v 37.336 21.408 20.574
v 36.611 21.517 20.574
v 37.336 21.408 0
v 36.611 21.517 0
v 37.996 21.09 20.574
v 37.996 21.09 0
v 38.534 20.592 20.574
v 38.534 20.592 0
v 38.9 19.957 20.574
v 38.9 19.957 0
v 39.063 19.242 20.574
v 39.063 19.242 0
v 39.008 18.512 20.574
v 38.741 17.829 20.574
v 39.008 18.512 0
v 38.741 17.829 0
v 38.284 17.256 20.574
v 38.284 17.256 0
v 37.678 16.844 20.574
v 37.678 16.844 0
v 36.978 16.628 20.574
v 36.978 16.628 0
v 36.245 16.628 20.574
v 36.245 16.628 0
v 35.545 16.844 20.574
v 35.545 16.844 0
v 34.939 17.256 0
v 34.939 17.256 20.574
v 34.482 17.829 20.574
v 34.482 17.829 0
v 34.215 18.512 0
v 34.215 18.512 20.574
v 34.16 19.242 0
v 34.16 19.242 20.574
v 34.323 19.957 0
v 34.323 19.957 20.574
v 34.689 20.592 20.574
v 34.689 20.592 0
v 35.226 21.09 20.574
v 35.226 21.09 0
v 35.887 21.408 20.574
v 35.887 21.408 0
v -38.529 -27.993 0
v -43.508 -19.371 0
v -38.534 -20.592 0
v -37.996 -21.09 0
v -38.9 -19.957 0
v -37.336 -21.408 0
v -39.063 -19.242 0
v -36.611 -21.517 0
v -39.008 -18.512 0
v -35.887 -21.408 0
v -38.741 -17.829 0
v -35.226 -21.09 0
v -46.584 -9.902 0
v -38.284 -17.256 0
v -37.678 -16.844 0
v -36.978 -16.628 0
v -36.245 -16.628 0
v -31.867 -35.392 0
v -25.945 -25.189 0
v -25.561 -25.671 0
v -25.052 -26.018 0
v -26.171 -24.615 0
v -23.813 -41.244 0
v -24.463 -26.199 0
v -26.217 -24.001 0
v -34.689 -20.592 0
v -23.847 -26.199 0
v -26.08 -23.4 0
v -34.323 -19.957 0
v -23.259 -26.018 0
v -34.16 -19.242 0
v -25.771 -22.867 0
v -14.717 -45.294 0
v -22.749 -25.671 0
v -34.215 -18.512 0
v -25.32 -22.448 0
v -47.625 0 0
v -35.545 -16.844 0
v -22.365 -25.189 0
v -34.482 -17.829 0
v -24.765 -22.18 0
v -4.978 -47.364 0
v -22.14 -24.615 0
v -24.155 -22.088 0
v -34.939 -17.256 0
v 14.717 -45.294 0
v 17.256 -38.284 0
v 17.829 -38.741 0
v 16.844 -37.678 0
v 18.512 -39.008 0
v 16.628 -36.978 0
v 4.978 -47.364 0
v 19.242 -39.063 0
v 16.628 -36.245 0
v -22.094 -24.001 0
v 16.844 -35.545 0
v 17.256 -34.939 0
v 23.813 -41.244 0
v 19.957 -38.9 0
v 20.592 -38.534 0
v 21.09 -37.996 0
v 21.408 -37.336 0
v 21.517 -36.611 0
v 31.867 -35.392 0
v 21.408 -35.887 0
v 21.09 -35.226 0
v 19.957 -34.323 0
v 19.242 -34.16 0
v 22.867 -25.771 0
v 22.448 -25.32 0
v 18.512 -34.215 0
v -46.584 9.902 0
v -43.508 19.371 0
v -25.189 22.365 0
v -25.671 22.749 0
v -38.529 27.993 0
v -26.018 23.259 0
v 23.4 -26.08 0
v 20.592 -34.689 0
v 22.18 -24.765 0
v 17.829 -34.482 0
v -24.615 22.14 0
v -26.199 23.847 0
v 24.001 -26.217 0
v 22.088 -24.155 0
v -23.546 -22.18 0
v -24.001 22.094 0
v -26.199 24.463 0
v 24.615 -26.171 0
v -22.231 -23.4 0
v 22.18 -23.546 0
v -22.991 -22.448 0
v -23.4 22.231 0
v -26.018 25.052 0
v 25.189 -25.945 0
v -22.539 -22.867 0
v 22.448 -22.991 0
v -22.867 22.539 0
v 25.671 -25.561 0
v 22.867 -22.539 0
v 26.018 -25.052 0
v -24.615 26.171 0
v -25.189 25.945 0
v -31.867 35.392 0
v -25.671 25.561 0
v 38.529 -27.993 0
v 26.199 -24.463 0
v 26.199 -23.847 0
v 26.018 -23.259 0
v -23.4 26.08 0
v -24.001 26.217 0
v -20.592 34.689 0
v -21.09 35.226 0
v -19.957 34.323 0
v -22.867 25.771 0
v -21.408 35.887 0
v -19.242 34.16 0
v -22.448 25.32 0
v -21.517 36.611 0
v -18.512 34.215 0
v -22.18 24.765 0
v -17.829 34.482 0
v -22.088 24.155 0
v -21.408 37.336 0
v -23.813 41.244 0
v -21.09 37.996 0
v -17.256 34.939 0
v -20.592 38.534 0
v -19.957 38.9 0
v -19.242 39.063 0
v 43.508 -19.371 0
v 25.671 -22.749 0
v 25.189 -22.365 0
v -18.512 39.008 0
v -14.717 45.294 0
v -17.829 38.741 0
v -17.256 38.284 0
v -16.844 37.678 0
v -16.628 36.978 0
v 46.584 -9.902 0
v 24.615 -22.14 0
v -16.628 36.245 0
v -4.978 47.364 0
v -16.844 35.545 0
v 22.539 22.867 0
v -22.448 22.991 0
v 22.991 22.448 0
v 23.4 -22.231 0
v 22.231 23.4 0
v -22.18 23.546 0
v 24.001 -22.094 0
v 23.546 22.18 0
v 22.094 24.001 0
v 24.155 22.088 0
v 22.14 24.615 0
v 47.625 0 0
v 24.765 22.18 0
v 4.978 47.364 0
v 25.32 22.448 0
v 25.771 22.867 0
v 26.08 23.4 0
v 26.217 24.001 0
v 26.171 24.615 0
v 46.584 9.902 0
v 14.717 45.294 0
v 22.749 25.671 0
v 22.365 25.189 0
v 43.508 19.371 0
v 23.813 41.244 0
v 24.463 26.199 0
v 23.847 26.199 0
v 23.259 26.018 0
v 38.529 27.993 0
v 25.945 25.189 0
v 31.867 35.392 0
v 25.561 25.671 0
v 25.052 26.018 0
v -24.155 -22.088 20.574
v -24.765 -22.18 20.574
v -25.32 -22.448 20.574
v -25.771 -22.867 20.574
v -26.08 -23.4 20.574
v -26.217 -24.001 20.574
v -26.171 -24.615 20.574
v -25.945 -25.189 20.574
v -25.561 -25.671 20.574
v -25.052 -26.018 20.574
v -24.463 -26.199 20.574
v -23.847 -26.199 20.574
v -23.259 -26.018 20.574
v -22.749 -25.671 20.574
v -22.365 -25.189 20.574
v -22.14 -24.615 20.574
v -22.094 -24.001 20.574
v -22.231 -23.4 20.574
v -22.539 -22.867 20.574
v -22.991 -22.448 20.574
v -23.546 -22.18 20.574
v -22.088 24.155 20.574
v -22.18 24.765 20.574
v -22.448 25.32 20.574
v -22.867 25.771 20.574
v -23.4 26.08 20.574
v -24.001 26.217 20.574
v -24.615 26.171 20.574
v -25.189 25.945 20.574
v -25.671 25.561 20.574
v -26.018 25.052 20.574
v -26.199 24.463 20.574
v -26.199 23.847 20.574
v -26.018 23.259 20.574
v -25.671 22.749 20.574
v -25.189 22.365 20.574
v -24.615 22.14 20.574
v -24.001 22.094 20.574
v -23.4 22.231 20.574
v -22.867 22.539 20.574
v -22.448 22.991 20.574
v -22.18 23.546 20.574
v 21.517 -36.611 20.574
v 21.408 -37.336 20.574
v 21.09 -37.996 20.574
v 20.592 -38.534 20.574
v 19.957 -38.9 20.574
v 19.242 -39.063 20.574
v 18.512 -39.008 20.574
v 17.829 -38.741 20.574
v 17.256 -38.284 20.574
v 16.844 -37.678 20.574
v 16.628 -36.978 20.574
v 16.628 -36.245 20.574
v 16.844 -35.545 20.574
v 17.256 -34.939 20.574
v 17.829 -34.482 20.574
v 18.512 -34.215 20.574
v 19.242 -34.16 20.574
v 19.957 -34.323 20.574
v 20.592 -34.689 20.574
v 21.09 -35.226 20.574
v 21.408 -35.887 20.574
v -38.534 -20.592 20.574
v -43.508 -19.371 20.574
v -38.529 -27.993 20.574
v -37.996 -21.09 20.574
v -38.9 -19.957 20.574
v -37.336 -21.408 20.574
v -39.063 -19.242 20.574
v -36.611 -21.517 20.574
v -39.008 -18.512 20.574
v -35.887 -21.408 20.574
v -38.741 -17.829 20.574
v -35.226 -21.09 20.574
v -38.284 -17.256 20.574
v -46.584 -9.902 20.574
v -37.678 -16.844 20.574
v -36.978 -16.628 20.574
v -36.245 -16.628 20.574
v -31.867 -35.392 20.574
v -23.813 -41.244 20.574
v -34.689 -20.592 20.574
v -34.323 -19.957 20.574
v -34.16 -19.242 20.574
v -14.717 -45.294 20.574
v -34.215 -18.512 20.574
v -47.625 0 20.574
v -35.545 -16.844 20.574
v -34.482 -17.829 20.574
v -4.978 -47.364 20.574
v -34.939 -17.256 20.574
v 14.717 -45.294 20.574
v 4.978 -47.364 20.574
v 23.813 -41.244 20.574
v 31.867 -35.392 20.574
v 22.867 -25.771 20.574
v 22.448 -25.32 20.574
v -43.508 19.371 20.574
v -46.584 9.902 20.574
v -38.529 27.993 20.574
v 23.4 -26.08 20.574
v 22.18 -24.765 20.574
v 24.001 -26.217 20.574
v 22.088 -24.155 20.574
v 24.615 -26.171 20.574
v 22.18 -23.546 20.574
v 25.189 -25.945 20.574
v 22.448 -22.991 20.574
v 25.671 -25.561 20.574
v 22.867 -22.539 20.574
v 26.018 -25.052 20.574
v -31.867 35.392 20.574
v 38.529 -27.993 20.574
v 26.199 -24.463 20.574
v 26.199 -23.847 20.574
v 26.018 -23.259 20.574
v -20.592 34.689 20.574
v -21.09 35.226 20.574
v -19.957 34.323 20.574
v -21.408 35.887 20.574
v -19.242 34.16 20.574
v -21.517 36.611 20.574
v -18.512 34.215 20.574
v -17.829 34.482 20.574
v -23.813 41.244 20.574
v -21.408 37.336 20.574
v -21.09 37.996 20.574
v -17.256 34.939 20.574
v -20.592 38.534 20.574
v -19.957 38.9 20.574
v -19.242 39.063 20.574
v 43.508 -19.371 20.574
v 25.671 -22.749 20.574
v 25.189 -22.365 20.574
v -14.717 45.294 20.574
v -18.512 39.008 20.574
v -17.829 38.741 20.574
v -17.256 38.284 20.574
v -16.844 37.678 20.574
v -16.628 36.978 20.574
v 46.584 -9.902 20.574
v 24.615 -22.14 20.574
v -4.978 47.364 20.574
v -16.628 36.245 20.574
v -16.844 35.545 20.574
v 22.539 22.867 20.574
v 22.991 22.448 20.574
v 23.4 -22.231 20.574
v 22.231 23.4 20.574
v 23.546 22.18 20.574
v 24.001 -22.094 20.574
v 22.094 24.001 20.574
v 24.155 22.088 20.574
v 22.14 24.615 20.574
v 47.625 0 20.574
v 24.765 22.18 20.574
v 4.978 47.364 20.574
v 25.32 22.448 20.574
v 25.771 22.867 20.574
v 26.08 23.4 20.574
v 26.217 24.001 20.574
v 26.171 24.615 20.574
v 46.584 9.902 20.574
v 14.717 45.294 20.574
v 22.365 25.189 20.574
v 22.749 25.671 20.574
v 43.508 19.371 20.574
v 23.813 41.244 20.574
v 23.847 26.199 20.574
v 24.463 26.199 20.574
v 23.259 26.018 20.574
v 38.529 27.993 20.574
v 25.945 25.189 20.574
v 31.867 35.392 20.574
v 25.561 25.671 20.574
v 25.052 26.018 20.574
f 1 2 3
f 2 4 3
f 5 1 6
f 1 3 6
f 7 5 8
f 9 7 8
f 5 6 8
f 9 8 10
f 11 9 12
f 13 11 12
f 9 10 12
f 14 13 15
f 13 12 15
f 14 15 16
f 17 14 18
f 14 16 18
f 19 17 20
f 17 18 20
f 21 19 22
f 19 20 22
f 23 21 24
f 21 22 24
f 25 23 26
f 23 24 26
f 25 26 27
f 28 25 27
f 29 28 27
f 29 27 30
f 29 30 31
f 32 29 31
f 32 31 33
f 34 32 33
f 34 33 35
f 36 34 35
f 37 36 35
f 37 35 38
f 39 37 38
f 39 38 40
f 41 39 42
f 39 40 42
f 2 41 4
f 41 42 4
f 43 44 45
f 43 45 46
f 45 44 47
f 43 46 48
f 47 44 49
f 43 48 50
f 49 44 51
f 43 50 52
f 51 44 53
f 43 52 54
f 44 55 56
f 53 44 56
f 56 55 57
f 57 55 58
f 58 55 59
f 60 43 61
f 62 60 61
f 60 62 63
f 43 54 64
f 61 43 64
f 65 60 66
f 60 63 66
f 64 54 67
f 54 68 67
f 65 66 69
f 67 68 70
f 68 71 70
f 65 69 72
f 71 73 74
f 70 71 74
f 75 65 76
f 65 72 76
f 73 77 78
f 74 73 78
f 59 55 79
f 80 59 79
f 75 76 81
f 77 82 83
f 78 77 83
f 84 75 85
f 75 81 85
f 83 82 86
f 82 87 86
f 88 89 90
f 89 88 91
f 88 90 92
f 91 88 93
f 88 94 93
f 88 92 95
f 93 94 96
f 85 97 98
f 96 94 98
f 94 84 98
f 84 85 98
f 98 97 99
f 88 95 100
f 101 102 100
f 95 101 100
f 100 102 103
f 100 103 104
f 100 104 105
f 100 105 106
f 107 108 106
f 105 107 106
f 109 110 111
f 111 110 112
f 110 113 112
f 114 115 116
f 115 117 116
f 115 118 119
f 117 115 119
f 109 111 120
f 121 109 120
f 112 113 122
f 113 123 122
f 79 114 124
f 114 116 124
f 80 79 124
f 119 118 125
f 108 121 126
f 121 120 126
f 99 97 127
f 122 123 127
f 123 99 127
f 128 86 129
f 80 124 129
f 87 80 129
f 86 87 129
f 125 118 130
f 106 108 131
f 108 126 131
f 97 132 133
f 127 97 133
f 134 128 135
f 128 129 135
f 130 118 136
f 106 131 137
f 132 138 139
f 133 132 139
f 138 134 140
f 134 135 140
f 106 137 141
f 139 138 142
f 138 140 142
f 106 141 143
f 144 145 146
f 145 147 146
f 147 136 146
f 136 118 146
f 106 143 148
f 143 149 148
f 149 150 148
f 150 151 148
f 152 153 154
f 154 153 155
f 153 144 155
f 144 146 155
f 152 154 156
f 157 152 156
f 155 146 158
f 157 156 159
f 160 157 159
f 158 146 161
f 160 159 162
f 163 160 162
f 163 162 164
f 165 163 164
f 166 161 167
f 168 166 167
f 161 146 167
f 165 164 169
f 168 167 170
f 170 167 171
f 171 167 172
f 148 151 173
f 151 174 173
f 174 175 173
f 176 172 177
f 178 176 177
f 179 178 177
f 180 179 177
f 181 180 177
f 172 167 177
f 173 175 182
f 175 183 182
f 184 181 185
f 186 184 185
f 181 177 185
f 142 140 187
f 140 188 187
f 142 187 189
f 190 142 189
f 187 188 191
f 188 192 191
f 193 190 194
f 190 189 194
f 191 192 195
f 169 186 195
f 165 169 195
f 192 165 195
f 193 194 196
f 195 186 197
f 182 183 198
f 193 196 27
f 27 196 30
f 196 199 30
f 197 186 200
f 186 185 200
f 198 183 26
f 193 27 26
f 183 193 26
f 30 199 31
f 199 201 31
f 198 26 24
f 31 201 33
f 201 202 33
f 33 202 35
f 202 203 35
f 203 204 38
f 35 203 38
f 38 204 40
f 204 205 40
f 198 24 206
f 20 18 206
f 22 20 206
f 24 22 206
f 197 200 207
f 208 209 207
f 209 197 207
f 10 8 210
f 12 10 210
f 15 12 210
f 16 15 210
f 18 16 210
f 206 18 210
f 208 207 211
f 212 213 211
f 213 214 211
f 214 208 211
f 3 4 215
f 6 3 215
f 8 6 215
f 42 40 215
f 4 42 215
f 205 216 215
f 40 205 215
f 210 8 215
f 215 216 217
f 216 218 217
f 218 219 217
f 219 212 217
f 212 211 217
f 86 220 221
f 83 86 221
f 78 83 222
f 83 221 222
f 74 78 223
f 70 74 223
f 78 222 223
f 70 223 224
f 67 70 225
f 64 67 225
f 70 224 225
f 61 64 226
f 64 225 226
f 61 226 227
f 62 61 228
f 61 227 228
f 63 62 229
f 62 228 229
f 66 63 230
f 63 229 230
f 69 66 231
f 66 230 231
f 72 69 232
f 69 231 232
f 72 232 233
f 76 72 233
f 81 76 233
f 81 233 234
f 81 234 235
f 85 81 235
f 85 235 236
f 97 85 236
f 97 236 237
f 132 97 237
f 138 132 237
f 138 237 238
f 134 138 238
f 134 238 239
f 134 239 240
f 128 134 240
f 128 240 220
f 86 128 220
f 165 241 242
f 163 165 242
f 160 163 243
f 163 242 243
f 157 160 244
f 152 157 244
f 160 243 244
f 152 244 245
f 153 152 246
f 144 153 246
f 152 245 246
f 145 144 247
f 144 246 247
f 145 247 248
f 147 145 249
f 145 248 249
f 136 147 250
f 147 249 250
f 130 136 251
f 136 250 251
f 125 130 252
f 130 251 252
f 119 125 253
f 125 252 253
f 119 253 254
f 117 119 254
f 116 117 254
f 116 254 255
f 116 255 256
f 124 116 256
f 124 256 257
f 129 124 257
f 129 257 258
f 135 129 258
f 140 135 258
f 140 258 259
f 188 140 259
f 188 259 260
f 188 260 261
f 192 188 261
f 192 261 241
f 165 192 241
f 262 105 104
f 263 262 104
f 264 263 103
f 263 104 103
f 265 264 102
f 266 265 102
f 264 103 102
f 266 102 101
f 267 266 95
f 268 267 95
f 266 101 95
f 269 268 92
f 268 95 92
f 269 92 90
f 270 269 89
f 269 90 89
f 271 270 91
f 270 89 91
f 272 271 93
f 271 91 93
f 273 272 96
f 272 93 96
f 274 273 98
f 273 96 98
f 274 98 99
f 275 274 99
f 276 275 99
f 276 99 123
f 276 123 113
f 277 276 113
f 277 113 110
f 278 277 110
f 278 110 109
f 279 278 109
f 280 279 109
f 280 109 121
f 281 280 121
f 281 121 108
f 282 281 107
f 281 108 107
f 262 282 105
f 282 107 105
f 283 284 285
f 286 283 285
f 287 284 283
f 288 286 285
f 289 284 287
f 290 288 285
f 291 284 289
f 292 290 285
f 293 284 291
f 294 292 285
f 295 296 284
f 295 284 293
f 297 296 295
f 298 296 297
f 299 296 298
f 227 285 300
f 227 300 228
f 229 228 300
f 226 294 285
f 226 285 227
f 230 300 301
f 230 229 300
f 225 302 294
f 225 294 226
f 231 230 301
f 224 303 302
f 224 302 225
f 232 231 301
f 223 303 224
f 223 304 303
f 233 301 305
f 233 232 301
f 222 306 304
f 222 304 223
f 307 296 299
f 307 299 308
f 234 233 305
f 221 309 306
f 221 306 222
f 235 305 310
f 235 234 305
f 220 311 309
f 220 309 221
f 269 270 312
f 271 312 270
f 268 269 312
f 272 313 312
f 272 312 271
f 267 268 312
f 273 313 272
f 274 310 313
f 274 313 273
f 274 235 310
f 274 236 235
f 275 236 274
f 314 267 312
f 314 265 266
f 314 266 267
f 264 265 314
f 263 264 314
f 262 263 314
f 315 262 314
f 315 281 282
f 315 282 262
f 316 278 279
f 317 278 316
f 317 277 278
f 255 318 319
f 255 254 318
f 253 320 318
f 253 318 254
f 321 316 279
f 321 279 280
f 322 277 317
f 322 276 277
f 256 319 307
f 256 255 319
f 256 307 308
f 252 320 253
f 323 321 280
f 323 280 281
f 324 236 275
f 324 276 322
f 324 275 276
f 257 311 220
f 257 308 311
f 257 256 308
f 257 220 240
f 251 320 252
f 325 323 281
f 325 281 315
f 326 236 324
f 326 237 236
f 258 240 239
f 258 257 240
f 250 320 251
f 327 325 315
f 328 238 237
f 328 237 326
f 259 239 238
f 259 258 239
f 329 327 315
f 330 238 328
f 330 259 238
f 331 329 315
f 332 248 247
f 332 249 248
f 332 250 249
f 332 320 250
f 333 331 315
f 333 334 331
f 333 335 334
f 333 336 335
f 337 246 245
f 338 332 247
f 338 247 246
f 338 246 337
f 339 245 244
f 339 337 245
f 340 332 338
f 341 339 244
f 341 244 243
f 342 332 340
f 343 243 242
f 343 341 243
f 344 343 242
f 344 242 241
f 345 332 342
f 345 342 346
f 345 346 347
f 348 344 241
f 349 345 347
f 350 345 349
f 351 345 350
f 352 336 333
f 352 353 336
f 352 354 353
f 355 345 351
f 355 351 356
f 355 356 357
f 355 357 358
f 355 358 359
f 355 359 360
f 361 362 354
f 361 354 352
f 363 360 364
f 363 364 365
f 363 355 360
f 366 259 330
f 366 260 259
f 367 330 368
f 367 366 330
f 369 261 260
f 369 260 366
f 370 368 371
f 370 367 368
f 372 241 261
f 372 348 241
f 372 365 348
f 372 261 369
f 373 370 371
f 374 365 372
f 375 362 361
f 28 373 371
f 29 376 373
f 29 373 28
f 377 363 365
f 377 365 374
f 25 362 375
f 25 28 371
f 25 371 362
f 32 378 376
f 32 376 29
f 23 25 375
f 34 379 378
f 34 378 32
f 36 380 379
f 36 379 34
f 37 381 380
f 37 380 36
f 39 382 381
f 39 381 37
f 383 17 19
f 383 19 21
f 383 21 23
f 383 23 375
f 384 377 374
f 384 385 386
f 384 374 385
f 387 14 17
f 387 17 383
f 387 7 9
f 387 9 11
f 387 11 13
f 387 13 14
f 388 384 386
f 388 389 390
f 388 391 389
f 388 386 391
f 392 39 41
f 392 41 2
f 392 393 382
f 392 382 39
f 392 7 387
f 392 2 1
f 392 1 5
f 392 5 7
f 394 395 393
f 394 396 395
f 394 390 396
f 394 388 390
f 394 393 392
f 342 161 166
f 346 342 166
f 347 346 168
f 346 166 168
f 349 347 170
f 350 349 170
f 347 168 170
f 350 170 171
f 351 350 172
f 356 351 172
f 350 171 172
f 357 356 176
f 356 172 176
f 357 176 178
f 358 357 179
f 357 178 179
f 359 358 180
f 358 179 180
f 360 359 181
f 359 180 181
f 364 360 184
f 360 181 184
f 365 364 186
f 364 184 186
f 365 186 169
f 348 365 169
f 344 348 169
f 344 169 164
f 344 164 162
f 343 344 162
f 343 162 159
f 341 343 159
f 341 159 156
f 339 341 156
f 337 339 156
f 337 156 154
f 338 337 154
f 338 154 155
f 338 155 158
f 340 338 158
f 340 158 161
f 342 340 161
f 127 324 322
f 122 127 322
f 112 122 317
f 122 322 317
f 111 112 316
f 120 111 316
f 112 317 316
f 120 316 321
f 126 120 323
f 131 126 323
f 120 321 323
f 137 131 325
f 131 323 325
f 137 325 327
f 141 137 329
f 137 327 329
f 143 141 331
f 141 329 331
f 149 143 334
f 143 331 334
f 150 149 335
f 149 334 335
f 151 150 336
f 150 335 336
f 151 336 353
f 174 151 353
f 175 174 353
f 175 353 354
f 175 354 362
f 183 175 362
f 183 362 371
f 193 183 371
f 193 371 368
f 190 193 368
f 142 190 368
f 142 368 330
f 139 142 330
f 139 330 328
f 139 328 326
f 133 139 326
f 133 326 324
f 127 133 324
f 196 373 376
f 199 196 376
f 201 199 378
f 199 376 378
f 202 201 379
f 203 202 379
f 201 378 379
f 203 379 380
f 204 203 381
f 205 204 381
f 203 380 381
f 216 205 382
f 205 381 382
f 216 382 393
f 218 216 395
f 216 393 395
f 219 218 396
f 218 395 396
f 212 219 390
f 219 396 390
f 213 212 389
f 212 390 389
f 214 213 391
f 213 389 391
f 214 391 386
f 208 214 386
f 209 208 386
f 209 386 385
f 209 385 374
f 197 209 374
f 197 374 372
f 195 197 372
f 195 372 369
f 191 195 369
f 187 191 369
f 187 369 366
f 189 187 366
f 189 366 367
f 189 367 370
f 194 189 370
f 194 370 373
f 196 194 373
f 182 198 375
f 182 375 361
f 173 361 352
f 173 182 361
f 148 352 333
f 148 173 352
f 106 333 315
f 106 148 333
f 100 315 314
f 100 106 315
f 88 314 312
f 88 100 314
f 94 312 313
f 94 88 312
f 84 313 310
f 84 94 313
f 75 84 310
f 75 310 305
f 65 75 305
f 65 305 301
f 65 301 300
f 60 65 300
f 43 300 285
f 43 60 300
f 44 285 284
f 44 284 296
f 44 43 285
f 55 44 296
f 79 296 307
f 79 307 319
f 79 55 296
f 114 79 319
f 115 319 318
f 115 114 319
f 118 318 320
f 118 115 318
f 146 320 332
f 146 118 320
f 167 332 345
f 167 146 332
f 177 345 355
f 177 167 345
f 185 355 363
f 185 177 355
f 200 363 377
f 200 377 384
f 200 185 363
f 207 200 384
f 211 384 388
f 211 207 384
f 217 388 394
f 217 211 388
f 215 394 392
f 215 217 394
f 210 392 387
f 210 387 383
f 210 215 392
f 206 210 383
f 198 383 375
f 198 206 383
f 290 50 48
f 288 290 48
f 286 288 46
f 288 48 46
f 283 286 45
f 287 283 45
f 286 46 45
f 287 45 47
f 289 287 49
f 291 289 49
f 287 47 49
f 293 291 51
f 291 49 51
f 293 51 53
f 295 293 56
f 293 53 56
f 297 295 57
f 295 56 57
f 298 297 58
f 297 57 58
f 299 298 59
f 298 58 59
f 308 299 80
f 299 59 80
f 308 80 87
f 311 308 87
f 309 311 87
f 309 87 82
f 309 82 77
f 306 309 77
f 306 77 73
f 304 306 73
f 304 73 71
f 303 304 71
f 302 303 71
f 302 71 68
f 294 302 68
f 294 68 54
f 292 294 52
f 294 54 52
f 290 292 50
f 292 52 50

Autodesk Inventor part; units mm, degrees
ref_plane "YZ Plane" through (0, 0, 0) normal (1, 0, 0) x (0, 1, 0)
ref_plane "XZ Plane" through (0, 0, 0) normal (0, 1, 0) x (-1, 0, 0)
ref_plane "XY Plane" through (0, 0, 0) normal (0, 0, 1) x (1, 0, 0)
sketch "Sketch1" plane through (0, 0, 0) normal (0, 0, 1) x (1, 0, 0)
  line L0 (0, 66.675) -> (0, -66.675) projected
  line L1 (-66.675, 0) -> (66.675, 0) projected
  circle A0 centre (0, 0) radius 47.625
  circle A1 centre (0, 0) radius 10.3188
  dimension "d0" = 20.6375
  dimension "d1" = 95.25
extrude "Extrusion1" add sketch "Sketch1" along normal blind 20.574
sketch "Sketch2" plane through (0, 0, 0) normal (0, 0, -1) x (-1, 0, 0)
  line L0 (0, -66.675) -> (0, 66.675) projected
  line L1 (-66.675, 0) -> (66.675, 0) projected
  line L2 (-24.1554, -24.1554) -> (24.1554, -24.1554) construction
  line L3 (24.1554, -24.1554) -> (24.1554, 24.1554) construction
  line L4 (24.1554, 24.1554) -> (-24.1554, 24.1554) construction
  line L5 (-24.1554, 24.1554) -> (-24.1554, -24.1554) construction
  line L6 (-24.1554, -24.1554) -> (24.1554, 24.1554) construction
  line L7 (24.1554, -24.1554) -> (-24.1554, 24.1554) construction
  circle A0 centre (0, 0) radius 34.1609 construction
  dimension "d25" = 68.3218
  dimension "d22" = 48.3108
hole "Hole1" at (-24.1554, -24.1554, 0) direction (0, 0, 1) diameter 4.134 end through all thread size "M5x0.8" class "6H" standard "ANSI Metric M Profile"
sketch "Sketch3" plane through (0, 0, 20.574) normal (0, 0, 1) x (1, 0, 0)
  line L0 (0, 66.675) -> (0, -66.675) projected
  line L1 (-66.675, 0) -> (66.675, 0) projected
  circle A0 centre (0, 0) radius 41.275 construction
  line L2 (0, 0) -> (-36.6114, -19.0587) construction
  point P0 (-24.1554, -24.1554)
  point P1 (-24.1554, -24.1554)
  dimension "d23" = 82.55
  dimension "d24" = 62.5
hole "Hole2" at (-36.6114, -19.0587, 20.574) direction (0, 0, -1) diameter 4.917 end through all thread size "M6x1" class "6H" standard "ANSI Metric M Profile"
pattern_circular "Circular Pattern1" count 4 over 360 about axis through (0, 0, -10) along (0, 0, 1) of "Hole1", "Hole2"
properties part number "J010343" material "ALUMINUM, 6061-T651"
